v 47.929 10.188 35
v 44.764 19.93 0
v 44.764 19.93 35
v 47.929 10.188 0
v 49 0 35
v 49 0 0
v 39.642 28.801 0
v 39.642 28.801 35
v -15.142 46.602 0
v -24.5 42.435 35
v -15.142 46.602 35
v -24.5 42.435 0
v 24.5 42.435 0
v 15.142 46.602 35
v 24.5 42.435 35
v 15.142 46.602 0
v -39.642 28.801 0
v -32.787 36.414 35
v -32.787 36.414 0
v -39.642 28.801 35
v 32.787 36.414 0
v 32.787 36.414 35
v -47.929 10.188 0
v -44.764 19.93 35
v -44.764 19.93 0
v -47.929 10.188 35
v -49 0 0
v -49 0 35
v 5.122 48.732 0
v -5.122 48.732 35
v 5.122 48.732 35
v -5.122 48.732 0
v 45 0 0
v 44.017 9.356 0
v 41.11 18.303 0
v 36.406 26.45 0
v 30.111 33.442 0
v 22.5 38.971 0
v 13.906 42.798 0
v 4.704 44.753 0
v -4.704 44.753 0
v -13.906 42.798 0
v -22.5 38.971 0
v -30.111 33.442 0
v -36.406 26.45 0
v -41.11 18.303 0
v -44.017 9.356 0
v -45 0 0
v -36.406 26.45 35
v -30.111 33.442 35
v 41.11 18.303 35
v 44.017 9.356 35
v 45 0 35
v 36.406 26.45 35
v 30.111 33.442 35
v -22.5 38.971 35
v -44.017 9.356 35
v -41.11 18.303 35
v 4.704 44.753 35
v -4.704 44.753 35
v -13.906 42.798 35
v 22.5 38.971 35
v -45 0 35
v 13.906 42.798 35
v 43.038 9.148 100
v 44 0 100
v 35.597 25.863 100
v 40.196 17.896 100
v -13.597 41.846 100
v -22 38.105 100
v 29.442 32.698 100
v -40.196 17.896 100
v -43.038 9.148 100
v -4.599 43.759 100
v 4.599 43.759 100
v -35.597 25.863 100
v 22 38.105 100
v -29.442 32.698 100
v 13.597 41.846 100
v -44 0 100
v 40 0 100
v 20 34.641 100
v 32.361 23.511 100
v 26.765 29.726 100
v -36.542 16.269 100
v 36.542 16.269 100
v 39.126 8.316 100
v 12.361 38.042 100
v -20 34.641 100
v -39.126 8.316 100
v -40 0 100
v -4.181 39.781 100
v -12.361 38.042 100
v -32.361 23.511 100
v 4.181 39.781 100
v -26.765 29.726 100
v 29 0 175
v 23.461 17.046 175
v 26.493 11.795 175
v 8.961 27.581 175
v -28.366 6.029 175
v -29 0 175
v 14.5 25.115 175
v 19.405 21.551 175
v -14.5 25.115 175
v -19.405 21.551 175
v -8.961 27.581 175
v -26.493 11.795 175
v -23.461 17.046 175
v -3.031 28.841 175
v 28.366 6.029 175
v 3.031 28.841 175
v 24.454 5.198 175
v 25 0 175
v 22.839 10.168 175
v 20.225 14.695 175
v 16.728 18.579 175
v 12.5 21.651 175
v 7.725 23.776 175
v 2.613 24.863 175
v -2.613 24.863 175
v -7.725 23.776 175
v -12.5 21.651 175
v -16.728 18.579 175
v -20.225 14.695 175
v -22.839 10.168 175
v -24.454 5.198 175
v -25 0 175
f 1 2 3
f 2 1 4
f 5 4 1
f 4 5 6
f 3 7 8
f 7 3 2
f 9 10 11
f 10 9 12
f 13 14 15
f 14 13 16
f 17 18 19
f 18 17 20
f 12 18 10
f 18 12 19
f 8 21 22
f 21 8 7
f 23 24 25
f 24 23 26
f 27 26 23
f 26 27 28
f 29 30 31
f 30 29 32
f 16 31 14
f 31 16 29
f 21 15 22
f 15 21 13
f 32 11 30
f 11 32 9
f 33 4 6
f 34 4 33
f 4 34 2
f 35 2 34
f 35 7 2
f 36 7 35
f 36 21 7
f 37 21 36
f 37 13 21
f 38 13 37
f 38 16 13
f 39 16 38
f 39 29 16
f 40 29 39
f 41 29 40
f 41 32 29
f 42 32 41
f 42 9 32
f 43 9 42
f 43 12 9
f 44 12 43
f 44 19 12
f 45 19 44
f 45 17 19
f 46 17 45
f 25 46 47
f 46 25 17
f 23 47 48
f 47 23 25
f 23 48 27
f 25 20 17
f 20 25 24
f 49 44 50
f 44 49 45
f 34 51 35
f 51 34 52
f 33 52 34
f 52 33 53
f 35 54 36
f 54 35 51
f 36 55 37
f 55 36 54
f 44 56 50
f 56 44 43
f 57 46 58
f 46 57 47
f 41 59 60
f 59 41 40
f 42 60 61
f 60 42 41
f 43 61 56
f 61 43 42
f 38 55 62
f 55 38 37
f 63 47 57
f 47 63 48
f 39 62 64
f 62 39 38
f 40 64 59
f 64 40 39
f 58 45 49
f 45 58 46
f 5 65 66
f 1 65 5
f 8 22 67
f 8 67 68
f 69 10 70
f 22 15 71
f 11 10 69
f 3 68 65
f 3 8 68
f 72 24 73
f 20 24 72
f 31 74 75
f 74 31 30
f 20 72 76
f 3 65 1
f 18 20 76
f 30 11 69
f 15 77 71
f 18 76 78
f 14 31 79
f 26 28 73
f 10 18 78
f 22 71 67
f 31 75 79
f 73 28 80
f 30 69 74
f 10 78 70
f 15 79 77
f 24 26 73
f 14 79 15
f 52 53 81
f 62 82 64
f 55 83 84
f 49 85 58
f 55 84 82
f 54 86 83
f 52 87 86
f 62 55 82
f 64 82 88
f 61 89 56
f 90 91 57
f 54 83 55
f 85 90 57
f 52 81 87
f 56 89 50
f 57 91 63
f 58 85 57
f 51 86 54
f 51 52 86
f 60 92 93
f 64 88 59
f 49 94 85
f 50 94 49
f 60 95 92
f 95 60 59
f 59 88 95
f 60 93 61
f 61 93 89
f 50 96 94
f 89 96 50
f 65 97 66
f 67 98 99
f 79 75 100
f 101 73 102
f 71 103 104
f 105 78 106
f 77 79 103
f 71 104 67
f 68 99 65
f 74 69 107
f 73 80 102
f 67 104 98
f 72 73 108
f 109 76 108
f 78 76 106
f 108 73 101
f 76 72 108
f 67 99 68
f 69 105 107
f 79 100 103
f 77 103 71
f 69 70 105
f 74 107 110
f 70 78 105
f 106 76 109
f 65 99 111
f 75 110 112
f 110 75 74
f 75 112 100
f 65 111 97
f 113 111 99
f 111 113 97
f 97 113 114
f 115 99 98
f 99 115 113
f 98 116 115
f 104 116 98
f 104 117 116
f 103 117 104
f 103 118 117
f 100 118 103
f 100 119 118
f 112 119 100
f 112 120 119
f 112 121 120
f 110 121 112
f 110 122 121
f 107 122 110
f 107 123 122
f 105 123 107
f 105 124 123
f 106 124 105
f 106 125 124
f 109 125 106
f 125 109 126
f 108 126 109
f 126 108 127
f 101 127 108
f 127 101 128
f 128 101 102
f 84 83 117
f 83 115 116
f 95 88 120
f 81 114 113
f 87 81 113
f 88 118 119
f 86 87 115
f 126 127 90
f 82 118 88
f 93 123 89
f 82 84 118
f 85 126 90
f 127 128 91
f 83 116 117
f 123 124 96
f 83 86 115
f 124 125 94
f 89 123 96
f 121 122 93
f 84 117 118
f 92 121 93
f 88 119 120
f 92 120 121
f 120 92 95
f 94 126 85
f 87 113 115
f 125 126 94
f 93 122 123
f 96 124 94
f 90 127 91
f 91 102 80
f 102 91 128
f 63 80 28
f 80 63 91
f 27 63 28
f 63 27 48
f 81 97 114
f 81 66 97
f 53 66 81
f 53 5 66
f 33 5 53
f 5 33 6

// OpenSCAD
module gauntlet(){
translate([22,-145,0])rotate([90,0,0]) import("lego_cuff_blank.stl", 3);
}
//scale([1.15,1.15,1.15])gauntlet();


t=4;
module elaineGauntlet(){
    difference(){
    union(){
     difference(){
        cylinder(r=45+t, h=35);
        cylinder(r=45, h=35);
     }   
     translate([0, 0,35])difference(){
       cylinder(r1=45+t, r2=40+t, h=65);
       cylinder(r1=45, r2=40, h=65);
     }
     translate([0, 0,100])difference(){
        cylinder(r1=40+t, r2=25+t, h=75);
        cylinder(r1=40, r2=25, h=75);
     }
    }
    translate([-45-t, -45-t, 0]) cube([90+2*t,45+t,190]);
    }
}

elaineGauntlet();
